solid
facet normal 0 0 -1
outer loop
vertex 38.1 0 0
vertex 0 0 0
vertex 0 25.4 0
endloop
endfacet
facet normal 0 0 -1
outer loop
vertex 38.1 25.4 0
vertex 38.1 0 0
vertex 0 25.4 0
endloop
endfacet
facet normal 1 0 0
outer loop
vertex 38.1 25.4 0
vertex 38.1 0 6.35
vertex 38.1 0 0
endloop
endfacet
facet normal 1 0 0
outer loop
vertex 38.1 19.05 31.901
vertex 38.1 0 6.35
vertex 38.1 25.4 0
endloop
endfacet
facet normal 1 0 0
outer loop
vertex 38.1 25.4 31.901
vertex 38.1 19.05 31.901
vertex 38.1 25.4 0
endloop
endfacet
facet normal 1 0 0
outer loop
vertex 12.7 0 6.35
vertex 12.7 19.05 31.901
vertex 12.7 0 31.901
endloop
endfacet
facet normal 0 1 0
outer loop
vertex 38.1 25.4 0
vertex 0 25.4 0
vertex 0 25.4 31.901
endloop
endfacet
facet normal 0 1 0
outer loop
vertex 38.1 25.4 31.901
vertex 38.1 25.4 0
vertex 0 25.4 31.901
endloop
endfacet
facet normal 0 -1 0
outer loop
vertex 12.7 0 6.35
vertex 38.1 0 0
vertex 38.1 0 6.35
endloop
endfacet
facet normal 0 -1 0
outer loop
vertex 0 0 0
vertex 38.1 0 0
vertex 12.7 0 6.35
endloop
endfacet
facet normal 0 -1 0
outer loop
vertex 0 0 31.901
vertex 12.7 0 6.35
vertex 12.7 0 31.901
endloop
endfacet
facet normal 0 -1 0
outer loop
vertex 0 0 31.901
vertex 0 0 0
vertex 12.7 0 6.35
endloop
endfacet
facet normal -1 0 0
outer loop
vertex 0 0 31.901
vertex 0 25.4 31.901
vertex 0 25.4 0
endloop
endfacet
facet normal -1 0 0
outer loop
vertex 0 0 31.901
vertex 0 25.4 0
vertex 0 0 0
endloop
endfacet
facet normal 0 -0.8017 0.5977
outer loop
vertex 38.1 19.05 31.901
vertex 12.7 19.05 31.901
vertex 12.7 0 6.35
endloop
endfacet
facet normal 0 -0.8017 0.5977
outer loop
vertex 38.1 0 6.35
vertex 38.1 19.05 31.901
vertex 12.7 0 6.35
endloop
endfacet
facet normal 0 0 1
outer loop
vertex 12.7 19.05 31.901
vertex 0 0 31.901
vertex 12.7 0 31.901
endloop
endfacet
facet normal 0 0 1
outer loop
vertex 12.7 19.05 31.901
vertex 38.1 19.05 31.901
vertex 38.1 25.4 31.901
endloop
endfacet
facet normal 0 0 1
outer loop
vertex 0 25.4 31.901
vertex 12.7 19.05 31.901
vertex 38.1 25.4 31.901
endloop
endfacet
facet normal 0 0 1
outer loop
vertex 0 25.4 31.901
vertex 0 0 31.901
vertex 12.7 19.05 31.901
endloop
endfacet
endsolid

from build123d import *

# Parameters (mm, degrees)
F1_DEPTH = 38.1
F3_DEPTH = 12.7


with BuildPart() as f1:
    # F0 (on Right) → F1 (new body)
    with BuildSketch(Plane.YZ):
        Polygon((0, 6.35), (0, 0), (25.4, 0), (25.4, 31.901197), (19.05, 31.901197), align=None)
    extrude(amount=F1_DEPTH)

    # F2 (on face) → F3 (join)
    with BuildSketch(Plane(origin=(0, 0, 0), x_dir=(0, -1, 0), z_dir=(-1, 0, 0))):
        Polygon((0, 31.901197), (-19.05, 31.901197), (0, 6.35), align=None)
    extrude(amount=-F3_DEPTH)


solid = f1.part
